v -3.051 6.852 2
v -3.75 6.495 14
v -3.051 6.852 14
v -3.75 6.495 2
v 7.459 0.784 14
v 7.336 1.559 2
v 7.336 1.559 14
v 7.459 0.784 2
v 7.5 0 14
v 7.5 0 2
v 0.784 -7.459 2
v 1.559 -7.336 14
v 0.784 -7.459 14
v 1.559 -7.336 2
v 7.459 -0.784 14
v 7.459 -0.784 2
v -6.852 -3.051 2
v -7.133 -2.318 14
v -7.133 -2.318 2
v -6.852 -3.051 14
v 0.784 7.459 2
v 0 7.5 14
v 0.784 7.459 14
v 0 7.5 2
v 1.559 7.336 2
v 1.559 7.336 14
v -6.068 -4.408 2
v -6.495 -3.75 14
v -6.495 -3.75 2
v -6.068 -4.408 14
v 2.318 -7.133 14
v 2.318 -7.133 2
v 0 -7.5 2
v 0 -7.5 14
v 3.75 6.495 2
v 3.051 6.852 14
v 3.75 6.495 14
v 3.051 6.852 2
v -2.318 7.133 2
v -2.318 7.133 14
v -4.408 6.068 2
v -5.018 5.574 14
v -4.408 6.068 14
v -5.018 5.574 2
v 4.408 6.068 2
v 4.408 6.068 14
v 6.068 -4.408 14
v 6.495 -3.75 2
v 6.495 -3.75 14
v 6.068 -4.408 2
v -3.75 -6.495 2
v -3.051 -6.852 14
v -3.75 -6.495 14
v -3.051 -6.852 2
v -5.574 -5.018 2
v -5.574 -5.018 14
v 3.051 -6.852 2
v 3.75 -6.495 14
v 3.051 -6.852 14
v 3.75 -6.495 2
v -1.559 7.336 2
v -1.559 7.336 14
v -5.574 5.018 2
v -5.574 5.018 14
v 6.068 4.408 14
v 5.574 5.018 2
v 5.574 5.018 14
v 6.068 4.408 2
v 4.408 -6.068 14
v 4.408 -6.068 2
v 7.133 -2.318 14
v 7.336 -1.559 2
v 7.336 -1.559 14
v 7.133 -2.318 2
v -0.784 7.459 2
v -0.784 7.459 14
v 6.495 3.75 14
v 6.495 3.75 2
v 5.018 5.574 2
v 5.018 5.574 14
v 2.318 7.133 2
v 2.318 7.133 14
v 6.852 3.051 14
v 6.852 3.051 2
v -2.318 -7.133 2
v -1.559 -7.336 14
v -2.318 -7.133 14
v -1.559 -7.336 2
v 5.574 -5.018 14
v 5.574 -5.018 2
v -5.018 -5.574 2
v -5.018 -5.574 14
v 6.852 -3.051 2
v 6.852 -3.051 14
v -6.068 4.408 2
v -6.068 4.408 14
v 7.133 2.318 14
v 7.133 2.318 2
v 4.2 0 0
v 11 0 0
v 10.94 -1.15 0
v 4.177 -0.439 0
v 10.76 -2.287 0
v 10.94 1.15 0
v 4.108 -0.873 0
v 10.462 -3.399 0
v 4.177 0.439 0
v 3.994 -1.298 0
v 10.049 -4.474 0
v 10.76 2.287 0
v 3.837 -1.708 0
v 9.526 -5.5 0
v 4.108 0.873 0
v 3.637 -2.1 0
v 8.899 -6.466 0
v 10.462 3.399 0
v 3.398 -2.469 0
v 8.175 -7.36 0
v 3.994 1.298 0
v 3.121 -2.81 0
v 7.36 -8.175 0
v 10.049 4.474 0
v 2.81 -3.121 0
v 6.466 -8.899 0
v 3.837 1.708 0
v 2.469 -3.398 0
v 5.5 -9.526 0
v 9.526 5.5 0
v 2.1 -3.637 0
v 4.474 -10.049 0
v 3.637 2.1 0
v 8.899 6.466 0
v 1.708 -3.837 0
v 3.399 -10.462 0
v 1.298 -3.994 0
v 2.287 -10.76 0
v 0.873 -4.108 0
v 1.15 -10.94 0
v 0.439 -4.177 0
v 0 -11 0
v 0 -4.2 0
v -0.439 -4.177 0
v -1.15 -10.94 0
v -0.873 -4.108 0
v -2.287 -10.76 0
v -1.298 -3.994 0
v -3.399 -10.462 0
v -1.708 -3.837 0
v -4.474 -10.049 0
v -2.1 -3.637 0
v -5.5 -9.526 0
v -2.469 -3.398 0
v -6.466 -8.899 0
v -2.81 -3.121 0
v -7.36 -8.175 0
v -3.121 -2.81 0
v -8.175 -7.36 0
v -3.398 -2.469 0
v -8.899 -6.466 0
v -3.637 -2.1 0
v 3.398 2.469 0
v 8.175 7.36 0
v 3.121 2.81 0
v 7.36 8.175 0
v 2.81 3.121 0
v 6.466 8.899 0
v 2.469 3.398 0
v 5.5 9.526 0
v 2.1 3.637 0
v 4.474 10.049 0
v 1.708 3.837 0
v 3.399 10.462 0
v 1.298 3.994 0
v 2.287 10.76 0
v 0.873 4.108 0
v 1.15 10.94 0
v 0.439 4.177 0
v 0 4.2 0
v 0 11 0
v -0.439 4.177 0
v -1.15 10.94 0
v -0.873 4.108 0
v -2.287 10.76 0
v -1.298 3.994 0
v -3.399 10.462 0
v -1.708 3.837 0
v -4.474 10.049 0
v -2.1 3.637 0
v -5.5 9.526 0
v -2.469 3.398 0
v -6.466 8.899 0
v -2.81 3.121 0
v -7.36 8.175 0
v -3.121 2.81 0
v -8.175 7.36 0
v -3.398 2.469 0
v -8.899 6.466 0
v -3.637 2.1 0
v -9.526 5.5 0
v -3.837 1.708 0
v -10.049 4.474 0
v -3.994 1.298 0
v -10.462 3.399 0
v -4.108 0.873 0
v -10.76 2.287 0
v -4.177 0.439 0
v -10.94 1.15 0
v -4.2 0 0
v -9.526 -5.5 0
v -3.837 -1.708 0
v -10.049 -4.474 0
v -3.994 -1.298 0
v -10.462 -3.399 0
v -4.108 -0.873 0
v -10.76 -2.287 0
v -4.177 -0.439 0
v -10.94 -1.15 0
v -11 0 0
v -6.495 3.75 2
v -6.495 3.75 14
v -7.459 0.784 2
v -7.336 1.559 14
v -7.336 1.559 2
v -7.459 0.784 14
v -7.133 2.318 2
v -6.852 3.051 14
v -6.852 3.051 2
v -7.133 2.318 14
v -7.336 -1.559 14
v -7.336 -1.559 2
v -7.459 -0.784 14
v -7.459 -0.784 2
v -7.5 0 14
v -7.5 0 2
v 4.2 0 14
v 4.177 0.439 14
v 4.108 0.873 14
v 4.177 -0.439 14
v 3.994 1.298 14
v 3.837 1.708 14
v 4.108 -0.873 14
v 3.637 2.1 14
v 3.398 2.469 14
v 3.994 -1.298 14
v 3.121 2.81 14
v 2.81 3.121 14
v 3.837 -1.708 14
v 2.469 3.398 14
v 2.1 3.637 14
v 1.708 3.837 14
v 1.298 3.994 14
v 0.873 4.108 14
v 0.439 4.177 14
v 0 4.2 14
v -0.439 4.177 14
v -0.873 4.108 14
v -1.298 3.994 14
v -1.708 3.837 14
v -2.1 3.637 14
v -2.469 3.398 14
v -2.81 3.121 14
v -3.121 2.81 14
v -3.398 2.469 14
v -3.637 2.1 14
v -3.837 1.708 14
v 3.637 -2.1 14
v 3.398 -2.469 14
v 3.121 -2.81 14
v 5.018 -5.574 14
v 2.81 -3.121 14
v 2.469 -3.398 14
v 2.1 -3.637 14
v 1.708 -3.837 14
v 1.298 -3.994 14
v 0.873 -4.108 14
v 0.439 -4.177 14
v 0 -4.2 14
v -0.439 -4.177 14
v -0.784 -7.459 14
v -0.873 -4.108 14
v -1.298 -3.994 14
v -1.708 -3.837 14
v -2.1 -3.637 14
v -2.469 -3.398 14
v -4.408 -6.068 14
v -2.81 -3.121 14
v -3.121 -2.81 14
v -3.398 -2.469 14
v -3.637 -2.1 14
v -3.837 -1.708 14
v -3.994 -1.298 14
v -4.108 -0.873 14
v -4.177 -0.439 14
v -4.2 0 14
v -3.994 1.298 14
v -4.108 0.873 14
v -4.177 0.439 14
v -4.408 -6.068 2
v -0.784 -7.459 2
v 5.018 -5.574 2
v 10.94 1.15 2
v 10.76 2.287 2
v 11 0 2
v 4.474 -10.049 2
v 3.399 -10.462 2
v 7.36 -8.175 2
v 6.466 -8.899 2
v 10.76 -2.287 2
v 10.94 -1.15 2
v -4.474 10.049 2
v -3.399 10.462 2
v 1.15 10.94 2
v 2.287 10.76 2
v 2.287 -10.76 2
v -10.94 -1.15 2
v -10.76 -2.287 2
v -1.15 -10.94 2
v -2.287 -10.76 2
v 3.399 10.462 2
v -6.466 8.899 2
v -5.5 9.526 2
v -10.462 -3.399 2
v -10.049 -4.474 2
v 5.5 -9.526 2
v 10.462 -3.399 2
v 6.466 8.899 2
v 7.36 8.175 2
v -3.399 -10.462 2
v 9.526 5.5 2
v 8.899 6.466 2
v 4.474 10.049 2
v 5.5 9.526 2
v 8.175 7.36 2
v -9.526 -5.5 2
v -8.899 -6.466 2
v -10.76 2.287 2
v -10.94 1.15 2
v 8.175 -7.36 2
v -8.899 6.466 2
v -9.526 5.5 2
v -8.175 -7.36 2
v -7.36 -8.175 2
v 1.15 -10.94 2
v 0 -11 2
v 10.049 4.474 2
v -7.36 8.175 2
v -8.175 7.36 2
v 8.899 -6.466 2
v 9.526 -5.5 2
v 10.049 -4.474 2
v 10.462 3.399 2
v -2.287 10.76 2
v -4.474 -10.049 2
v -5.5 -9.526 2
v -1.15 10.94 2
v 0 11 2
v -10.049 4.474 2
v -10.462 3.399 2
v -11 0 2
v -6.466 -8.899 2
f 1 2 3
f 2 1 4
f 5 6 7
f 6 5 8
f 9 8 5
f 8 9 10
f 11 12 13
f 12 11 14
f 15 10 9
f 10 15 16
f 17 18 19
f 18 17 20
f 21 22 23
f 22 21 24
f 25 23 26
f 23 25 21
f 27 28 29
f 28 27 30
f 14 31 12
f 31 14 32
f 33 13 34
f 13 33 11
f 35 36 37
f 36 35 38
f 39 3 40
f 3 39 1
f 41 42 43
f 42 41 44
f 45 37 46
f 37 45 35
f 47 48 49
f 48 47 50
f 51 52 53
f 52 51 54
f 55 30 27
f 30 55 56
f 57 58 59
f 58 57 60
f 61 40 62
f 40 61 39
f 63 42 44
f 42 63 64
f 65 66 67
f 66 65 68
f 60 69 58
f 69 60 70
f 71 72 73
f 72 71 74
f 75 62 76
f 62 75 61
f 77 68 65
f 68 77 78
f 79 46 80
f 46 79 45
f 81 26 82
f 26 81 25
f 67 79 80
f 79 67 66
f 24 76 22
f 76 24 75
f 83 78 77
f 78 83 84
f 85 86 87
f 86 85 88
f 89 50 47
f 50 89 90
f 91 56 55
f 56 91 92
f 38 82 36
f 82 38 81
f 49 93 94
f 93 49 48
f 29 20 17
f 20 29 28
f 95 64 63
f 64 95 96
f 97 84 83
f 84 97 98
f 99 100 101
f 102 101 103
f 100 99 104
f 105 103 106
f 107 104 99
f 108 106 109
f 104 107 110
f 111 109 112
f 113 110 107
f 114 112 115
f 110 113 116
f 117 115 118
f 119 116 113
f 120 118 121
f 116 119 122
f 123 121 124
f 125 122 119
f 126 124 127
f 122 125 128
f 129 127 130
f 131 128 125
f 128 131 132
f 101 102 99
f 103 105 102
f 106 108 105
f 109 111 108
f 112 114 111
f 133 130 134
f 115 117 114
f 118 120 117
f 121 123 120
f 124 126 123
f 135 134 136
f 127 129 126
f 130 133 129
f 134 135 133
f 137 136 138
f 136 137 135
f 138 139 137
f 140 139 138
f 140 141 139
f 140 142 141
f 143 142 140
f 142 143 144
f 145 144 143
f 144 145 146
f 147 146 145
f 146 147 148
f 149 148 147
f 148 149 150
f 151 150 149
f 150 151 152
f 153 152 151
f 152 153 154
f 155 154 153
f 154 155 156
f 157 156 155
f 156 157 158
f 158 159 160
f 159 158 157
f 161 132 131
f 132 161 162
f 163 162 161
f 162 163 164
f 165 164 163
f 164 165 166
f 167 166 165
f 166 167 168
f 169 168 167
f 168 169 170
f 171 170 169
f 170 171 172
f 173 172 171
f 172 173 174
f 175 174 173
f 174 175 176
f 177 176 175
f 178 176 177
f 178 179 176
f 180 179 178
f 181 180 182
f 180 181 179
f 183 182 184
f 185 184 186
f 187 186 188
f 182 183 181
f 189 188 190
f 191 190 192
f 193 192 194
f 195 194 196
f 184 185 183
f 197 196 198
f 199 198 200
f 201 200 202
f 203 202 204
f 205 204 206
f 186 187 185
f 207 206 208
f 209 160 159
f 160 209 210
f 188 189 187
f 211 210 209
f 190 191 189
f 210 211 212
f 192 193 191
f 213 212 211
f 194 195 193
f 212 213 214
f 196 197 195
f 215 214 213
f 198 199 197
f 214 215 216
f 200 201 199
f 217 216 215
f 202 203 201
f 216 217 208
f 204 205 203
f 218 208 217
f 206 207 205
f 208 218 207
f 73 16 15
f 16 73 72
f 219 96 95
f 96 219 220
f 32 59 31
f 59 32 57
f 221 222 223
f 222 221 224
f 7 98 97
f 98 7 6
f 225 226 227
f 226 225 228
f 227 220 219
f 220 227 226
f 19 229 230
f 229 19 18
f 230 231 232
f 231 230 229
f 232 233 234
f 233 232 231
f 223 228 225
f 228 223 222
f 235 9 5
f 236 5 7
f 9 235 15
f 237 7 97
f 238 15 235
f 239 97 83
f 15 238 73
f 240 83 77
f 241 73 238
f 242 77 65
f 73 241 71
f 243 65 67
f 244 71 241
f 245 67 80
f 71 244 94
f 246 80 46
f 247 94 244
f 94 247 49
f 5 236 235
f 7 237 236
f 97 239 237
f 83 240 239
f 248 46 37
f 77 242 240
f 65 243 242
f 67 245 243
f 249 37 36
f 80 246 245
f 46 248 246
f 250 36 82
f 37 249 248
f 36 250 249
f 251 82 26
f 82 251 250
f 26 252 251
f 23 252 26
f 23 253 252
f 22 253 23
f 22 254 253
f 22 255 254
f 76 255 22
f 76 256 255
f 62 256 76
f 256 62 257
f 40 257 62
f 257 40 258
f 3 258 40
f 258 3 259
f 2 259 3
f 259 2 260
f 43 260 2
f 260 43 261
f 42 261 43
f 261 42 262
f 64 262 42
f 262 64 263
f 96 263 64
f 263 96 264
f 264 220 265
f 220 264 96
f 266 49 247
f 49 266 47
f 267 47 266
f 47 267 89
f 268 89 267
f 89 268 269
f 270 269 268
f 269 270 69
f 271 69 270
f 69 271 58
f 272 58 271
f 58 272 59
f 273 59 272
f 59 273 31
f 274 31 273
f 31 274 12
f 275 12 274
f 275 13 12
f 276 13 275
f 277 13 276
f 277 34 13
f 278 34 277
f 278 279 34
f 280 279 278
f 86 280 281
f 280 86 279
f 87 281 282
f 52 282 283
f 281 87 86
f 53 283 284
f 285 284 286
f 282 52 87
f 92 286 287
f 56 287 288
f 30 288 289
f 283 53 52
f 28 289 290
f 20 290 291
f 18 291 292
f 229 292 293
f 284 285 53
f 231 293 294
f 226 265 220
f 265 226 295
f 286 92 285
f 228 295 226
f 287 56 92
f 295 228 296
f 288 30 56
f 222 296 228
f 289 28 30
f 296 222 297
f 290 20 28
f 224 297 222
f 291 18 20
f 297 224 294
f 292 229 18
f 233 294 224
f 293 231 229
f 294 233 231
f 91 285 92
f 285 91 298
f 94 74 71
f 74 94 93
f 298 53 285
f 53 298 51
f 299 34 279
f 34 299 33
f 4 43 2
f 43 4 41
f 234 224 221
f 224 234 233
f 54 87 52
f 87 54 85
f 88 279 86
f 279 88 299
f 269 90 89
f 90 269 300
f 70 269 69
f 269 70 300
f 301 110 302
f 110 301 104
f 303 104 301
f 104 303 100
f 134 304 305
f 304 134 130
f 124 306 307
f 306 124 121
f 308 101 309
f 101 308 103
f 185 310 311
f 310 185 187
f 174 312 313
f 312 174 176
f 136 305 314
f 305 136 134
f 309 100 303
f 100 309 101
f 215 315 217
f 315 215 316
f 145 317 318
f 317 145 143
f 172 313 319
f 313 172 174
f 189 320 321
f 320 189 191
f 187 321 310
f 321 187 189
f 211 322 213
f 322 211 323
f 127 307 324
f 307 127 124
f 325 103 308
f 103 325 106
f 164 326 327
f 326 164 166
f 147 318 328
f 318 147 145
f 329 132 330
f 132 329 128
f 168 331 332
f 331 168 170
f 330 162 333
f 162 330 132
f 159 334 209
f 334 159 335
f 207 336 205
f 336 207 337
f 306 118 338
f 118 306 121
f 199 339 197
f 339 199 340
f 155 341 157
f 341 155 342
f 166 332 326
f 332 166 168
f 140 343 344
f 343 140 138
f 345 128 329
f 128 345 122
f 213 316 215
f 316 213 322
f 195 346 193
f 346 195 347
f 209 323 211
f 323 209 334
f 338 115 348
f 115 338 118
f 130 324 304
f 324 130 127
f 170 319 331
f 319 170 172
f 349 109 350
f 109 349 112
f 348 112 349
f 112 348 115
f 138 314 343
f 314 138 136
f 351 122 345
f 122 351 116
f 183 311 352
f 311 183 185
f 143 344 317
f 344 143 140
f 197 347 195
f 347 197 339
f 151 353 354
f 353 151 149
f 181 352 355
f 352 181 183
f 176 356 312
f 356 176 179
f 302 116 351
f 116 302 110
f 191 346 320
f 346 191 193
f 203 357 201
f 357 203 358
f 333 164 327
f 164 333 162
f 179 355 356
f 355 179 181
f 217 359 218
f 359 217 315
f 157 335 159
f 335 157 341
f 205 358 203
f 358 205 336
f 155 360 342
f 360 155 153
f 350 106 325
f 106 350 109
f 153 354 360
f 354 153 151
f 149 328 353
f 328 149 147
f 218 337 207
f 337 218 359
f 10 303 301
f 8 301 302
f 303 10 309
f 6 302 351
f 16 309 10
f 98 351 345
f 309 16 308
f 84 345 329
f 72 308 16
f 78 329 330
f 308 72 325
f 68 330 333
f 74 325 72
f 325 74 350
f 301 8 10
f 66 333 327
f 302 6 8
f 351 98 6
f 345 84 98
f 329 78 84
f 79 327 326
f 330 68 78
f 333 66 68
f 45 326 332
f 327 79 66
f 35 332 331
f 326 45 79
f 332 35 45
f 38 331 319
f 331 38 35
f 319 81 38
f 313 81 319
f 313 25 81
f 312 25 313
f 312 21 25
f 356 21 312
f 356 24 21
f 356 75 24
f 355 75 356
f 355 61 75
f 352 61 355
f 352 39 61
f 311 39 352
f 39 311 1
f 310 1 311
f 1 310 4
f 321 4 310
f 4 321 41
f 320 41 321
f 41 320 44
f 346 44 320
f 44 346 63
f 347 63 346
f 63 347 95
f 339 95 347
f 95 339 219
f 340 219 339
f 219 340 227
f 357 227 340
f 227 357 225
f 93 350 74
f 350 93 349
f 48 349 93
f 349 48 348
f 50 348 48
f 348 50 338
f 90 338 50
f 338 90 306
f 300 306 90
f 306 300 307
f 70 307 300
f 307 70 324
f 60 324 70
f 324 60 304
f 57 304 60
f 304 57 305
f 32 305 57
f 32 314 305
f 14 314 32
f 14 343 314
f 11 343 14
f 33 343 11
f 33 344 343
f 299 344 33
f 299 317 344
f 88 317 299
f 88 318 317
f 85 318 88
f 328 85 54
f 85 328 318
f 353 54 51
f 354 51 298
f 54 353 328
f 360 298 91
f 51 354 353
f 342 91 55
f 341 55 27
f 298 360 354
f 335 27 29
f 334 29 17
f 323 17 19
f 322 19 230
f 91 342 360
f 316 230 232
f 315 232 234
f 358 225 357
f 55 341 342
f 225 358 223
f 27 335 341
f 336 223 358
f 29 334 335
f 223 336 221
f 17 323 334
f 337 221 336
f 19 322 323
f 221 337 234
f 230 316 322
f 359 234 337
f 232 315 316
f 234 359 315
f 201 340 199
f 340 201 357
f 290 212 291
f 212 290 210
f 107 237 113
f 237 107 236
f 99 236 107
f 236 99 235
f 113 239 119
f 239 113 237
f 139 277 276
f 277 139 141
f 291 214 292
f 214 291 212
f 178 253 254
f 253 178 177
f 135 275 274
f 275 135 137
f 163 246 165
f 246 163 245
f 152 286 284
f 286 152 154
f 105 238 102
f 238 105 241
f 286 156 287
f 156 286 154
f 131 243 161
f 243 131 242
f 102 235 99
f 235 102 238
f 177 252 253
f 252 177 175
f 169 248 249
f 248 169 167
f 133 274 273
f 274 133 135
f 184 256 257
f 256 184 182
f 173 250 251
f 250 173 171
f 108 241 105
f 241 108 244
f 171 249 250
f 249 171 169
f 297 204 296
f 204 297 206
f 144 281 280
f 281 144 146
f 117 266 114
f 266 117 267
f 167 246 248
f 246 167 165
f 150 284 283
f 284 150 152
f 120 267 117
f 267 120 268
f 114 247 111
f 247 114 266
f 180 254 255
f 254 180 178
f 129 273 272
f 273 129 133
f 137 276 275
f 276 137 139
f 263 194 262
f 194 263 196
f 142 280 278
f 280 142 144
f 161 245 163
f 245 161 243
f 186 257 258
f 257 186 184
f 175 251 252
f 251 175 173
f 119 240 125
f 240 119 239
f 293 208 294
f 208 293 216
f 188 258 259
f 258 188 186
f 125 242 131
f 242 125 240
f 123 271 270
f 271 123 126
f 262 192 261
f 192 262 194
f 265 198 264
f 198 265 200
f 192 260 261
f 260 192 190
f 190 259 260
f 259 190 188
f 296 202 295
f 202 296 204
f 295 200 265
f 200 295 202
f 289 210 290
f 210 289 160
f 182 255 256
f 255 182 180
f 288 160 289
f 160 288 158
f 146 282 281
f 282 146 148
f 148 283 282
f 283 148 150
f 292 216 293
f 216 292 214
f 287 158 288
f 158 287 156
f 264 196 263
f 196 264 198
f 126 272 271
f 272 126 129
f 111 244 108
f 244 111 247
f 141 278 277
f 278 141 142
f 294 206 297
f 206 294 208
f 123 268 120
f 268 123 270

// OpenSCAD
// Flanged threaded insert.
$fn = 60;
eps = 0.02;
inner_d = 8.4;
outer_d = 15;
length = 14;
flange_d = 22;
difference() {
    union() { cylinder(d=outer_d,h=length); cylinder(d=flange_d,h=2); }
    translate([0,0,-eps]) cylinder(d=inner_d,h=length+2*eps);
}
